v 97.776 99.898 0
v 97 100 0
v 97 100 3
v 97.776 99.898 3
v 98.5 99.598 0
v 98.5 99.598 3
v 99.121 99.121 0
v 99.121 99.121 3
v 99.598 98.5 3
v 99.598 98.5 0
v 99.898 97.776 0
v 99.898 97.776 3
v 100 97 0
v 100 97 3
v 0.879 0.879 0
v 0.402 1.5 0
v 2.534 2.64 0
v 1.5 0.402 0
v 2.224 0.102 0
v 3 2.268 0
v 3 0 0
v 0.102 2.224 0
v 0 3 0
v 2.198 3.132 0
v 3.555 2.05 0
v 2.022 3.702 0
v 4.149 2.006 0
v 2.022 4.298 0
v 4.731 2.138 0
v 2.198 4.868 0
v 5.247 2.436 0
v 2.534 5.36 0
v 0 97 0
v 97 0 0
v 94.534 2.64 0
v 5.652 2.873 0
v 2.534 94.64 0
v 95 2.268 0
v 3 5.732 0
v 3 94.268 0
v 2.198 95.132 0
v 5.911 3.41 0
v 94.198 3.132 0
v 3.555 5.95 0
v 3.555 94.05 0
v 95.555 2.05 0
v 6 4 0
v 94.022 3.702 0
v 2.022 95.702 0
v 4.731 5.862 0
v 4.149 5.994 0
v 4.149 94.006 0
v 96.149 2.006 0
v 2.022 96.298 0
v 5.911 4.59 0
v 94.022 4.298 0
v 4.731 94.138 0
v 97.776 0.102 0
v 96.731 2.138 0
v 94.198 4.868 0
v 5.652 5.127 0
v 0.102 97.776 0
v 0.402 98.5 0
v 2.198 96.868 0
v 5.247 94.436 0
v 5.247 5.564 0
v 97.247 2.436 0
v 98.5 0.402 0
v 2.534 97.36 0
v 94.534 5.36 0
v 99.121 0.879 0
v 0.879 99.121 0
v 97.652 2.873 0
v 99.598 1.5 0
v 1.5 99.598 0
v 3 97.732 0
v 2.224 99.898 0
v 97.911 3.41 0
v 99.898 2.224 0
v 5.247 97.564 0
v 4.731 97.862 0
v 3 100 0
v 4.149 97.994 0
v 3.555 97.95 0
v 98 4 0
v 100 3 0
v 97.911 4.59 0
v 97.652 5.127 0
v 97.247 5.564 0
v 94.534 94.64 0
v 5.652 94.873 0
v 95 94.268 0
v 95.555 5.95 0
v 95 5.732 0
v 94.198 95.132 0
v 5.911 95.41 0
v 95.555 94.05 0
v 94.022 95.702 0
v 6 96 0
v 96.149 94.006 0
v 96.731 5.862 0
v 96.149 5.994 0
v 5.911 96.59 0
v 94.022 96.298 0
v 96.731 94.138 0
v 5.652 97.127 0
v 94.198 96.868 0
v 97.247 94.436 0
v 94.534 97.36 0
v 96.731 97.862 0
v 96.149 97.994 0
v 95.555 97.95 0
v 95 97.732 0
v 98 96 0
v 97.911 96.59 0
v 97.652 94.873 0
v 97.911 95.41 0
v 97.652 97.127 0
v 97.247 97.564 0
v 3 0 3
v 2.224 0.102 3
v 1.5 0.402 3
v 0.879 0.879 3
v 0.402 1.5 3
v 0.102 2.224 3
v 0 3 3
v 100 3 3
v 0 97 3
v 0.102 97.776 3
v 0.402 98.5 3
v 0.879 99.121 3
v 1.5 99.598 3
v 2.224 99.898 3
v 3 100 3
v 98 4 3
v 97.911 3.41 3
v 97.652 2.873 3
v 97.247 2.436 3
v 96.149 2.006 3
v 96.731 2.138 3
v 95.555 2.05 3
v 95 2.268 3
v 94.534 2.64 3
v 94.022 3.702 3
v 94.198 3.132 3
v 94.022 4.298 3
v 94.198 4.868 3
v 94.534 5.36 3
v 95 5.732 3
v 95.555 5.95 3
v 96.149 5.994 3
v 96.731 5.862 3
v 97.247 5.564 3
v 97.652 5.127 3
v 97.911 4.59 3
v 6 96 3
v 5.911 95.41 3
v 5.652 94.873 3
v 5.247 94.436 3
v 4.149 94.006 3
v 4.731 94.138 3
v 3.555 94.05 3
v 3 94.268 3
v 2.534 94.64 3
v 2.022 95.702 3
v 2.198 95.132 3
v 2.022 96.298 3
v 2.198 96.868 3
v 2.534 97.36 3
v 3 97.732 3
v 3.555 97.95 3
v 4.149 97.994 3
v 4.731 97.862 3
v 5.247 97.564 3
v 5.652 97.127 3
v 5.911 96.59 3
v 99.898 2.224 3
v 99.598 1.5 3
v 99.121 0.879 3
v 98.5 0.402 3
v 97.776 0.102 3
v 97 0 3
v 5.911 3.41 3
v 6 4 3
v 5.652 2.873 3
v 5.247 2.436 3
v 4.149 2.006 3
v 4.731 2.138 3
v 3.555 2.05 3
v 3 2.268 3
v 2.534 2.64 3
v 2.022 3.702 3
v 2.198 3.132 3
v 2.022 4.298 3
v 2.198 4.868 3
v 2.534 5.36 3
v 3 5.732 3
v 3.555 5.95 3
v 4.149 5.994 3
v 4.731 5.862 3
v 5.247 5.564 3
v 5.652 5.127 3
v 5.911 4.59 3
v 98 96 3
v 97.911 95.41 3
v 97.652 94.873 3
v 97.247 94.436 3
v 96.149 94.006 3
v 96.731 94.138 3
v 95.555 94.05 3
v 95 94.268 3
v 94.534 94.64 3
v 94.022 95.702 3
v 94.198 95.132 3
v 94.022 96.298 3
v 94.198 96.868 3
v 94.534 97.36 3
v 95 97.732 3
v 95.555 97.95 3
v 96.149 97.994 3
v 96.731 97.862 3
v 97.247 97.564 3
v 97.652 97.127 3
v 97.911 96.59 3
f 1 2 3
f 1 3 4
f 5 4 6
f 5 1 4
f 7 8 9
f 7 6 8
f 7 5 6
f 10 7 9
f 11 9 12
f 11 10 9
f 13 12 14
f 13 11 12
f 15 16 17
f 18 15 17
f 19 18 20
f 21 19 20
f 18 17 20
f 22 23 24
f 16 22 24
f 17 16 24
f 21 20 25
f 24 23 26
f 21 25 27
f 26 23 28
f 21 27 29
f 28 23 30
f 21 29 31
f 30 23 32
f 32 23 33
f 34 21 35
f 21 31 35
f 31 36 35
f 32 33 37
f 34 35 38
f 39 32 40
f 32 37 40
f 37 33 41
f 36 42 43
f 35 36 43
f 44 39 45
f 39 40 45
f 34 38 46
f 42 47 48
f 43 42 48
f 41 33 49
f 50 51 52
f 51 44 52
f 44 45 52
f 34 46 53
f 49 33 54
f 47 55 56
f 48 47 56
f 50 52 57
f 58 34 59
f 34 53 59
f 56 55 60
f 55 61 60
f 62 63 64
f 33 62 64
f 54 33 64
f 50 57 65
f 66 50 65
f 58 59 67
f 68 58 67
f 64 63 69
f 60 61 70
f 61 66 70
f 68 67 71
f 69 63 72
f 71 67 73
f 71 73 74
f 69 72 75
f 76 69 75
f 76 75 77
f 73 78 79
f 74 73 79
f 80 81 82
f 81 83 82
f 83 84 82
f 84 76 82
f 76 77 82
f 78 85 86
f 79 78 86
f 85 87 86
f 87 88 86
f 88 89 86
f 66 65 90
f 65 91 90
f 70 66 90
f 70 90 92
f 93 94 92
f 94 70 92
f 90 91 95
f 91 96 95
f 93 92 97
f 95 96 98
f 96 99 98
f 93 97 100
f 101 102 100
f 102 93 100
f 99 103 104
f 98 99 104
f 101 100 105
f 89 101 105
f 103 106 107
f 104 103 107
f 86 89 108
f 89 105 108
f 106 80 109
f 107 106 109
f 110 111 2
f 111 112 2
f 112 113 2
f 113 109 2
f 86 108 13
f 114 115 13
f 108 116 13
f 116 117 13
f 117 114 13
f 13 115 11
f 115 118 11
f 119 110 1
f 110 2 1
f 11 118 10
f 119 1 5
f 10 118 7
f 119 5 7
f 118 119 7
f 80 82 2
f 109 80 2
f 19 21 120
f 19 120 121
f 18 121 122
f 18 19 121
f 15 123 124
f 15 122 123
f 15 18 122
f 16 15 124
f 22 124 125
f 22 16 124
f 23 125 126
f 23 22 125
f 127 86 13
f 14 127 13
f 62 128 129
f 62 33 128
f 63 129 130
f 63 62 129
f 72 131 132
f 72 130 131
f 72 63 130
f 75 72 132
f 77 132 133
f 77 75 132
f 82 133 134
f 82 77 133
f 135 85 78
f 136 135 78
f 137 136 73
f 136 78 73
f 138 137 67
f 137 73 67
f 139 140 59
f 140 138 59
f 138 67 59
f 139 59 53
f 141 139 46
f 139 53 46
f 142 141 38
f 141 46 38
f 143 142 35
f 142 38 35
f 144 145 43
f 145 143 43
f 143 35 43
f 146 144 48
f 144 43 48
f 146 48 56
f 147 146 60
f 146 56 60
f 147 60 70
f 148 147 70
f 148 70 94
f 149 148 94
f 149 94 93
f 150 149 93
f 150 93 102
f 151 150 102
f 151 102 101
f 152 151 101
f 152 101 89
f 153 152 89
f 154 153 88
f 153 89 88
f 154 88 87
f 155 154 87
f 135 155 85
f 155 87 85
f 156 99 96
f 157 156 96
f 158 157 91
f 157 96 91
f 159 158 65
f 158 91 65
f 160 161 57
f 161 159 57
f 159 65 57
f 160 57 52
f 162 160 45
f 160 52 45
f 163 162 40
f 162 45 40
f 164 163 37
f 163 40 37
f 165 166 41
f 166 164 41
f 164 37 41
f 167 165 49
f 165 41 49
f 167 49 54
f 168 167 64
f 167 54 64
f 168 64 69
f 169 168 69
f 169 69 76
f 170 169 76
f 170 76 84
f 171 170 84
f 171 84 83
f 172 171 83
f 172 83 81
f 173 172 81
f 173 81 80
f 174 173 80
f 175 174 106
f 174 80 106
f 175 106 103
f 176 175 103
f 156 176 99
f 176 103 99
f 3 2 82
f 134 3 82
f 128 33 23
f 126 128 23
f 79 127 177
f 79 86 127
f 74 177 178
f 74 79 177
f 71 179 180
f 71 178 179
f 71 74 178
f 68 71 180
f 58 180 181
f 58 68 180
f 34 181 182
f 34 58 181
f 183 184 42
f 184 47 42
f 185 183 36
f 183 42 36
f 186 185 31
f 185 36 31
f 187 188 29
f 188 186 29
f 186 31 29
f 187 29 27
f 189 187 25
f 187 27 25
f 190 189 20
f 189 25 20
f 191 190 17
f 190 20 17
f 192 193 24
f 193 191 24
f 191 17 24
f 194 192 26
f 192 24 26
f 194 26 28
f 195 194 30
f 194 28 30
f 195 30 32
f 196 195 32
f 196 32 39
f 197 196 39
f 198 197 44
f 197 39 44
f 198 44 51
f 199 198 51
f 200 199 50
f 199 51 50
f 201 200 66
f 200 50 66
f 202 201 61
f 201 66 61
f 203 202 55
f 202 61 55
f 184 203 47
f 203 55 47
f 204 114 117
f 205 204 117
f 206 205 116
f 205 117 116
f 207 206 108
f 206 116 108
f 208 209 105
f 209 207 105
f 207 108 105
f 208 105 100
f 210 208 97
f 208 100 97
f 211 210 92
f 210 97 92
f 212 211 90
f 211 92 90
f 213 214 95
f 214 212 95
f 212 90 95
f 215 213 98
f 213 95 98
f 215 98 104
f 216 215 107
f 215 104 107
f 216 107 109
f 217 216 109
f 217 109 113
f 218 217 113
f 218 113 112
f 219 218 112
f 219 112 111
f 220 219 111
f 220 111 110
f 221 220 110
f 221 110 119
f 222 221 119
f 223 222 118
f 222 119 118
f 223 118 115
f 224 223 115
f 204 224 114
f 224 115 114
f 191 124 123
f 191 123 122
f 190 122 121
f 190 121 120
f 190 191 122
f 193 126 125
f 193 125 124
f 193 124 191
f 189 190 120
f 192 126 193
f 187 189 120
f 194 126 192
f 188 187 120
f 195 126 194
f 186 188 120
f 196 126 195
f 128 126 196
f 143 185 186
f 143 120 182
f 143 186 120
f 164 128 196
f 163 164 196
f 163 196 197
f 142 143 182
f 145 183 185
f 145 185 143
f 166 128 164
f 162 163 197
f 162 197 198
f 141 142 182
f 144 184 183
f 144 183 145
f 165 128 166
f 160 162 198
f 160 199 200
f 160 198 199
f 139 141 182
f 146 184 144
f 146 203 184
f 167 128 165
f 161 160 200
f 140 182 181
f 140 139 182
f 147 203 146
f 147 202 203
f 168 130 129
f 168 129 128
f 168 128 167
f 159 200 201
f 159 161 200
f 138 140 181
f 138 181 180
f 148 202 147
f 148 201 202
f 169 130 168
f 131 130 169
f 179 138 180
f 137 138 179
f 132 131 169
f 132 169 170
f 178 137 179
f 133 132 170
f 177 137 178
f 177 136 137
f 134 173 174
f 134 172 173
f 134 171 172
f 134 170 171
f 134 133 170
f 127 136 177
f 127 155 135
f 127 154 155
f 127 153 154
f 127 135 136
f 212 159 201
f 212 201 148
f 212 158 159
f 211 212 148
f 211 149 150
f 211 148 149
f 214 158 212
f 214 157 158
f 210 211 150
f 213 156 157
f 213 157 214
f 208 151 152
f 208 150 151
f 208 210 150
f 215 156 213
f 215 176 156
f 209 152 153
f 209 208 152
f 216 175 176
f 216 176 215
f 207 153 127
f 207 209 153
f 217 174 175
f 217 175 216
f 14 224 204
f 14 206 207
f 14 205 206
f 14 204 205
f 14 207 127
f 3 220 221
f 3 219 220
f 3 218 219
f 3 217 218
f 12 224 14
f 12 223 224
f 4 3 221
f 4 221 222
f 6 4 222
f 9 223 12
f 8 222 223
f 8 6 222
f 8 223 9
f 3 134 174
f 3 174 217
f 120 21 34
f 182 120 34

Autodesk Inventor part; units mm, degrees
ref_plane "YZ Plane" through (0, 0, 0) normal (1, 0, 0) x (0, 1, 0)
ref_plane "XZ Plane" through (0, 0, 0) normal (0, 1, 0) x (-1, 0, 0)
ref_plane "XY Plane" through (0, 0, 0) normal (0, 0, 1) x (1, 0, 0)
sketch "Sketch1" plane through (0, 0, 0) normal (0, 0, 1) x (1, 0, 0)
  line L0 (3, 0) -> (97, 0)
  line L1 (100, 3) -> (100, 97)
  line L2 (97, 100) -> (3, 100)
  line L3 (0, 97) -> (0, 3)
  line L4 (4, 96) -> (96, 96) construction
  line L5 (96, 96) -> (96, 4) construction
  line L6 (96, 4) -> (4, 4) construction
  line L7 (4, 4) -> (4, 96) construction
  arc A0 (3, 100) -> (0, 97) centre (3, 97) ccw
  arc A1 (0, 3) -> (3, 0) centre (3, 3) ccw
  arc A2 (97, 0) -> (100, 3) centre (97, 3) ccw
  arc A3 (100, 97) -> (97, 100) centre (97, 97) ccw
  circle A4 centre (4, 96) radius 2
  circle A5 centre (96, 96) radius 2
  circle A6 centre (4, 4) radius 2
  circle A7 centre (96, 4) radius 2
  point P0 (0, 0)
  point P1 (100, 100)
  point P2 (100, 0)
  point P3 (0, 100)
  dimension "d0" = 100
  dimension "d1" = 100
  dimension "d4" = 4
  dimension "d5" = 3
  dimension "d6" = 4
extrude "Extrusion2" add sketch "Sketch1" along normal blind 3
properties part number "INFORCE"
